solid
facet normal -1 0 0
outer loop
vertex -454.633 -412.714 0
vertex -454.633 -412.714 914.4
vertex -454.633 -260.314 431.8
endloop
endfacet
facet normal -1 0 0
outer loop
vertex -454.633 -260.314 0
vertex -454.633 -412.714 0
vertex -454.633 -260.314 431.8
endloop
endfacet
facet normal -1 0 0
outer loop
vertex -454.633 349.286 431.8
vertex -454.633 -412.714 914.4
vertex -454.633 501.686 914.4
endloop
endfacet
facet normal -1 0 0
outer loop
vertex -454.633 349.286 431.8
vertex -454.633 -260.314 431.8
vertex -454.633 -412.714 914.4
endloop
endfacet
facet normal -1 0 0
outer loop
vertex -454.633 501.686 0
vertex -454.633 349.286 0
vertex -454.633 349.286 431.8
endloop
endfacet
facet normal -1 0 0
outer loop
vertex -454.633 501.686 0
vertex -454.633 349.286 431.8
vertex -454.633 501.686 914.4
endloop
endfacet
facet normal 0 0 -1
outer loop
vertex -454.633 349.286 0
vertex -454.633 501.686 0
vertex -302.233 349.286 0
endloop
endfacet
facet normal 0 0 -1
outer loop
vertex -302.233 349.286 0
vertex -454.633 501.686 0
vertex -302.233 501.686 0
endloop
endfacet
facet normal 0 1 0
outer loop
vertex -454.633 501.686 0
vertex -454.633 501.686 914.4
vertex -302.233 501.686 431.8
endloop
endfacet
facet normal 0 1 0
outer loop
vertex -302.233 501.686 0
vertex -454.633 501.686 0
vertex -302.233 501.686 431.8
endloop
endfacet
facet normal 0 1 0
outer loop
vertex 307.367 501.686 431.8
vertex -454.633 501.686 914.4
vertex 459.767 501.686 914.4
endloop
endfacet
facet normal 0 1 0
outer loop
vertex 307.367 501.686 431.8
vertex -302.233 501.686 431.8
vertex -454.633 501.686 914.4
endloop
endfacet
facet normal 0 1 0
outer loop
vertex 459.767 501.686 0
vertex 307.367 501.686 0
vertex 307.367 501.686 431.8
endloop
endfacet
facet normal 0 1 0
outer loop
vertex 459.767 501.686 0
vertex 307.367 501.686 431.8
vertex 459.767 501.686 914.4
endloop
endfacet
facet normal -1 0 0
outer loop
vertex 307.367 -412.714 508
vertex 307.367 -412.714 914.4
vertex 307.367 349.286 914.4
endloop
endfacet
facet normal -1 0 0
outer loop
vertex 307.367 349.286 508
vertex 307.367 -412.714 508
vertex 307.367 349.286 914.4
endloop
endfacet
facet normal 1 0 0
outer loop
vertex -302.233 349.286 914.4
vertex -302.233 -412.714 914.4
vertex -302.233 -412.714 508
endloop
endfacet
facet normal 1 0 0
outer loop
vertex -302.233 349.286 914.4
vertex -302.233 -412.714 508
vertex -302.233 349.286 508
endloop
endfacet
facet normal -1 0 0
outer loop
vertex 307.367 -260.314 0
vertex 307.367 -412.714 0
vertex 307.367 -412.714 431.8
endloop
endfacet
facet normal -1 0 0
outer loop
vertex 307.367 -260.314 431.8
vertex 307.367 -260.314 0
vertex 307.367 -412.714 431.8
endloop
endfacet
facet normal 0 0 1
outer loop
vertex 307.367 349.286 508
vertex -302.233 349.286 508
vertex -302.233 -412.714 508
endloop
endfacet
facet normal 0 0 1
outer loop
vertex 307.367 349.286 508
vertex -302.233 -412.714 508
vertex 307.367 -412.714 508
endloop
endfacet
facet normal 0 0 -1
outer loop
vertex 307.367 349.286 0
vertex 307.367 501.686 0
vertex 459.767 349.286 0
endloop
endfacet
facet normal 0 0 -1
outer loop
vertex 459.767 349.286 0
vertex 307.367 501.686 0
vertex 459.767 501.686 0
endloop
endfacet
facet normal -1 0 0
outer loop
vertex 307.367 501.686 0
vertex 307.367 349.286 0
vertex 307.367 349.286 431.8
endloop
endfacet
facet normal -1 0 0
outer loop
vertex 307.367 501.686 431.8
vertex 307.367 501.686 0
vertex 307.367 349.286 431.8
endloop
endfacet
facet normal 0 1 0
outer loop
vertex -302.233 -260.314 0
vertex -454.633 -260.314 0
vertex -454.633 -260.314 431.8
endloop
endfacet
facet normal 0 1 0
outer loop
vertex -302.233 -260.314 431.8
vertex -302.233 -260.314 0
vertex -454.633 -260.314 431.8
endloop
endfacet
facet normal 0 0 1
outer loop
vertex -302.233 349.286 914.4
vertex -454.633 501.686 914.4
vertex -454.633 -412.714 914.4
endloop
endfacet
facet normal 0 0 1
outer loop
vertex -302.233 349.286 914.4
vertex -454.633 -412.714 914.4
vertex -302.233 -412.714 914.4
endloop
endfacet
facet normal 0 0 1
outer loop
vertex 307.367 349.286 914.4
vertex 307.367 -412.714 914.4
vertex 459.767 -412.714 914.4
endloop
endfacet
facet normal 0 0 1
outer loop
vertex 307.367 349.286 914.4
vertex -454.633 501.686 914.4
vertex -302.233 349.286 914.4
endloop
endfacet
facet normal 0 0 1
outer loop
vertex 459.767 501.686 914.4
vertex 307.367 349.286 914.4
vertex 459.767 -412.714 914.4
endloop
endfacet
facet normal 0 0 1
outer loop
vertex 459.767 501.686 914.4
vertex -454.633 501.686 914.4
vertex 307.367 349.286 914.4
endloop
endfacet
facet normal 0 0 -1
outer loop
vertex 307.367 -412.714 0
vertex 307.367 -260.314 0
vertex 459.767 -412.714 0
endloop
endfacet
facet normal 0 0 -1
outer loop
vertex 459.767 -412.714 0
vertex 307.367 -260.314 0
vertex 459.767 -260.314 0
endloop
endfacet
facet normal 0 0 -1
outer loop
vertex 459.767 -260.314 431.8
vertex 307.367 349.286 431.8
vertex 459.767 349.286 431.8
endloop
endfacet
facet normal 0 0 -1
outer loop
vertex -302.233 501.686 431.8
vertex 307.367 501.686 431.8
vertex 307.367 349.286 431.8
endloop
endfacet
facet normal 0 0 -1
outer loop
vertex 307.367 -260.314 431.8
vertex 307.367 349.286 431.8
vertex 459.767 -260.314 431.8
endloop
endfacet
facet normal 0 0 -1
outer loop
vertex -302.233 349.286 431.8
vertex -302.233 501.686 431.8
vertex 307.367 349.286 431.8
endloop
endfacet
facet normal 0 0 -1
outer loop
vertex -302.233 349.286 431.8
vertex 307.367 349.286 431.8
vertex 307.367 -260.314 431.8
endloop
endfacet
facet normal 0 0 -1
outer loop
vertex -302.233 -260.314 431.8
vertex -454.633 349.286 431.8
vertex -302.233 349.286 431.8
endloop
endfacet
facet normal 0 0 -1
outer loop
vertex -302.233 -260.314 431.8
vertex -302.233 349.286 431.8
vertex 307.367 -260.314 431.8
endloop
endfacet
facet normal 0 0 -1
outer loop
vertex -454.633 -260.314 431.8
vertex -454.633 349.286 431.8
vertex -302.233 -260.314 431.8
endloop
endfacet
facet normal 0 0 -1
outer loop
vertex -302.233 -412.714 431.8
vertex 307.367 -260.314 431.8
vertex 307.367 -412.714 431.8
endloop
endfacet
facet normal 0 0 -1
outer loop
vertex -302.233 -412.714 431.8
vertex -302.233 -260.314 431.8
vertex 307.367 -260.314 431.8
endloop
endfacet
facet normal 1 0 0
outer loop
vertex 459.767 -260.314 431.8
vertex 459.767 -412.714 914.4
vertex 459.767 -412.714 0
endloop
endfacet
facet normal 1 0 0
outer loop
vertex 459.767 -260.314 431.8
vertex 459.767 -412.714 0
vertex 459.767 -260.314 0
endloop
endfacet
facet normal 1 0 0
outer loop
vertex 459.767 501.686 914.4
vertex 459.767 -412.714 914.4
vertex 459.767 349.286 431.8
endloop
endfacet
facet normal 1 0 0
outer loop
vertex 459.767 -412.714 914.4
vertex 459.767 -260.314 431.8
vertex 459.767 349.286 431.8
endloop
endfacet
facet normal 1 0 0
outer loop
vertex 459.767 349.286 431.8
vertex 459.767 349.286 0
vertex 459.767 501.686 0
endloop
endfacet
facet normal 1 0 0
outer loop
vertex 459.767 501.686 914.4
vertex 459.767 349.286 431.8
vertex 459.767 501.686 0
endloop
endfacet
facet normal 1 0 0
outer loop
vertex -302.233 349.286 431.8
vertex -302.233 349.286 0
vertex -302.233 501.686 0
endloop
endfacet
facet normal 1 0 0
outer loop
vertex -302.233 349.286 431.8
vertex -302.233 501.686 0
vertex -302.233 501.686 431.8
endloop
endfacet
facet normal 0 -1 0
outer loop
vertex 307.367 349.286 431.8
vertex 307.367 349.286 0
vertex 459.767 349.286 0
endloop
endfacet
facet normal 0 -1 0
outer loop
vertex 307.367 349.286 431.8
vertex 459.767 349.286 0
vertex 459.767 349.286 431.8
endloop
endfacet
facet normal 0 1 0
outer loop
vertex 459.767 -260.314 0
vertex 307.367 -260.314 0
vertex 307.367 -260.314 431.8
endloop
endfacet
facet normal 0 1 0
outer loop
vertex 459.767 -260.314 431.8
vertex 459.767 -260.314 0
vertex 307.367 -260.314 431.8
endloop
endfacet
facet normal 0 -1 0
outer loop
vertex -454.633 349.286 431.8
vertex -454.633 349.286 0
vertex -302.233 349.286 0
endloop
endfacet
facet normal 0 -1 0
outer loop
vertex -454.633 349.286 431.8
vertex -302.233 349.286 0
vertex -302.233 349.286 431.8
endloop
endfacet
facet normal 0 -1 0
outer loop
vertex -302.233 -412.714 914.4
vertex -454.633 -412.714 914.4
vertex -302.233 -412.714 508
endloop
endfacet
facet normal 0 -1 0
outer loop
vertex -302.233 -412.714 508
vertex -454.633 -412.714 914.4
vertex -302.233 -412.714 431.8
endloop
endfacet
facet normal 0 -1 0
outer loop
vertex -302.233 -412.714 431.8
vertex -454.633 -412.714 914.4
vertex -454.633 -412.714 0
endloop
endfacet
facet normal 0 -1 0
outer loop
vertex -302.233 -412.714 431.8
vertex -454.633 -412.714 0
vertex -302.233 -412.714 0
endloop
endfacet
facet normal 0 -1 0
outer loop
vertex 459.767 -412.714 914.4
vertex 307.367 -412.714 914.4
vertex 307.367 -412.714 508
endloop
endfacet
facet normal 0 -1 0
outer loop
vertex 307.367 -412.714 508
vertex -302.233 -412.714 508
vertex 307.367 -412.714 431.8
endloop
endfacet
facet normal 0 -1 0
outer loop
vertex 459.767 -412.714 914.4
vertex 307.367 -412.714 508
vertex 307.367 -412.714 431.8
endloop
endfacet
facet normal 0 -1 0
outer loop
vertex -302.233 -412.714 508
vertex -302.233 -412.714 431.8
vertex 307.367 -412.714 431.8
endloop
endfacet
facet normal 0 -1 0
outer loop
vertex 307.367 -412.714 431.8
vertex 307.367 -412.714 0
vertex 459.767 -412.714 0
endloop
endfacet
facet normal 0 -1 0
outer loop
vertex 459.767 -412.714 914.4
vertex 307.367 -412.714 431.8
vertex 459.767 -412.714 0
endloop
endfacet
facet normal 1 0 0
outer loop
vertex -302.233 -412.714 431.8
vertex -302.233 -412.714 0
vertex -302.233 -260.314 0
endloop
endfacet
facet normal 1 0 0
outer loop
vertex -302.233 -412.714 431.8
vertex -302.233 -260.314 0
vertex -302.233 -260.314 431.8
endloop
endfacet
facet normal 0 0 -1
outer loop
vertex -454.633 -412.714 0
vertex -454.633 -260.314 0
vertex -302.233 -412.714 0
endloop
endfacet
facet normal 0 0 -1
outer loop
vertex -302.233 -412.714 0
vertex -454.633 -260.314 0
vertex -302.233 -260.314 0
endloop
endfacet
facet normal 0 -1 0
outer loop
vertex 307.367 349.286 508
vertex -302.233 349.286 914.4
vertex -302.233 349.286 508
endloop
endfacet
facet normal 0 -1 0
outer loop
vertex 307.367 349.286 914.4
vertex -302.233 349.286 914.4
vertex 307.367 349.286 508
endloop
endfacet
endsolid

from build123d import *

# Parameters (mm, degrees)
F0_W     = 914.4
F0_H     = 914.4
F1_DEPTH = 914.4
F2_W     = 609.6
F2_H     = 762
F3_DEPTH = 406.4
F4_W     = 609.6
F4_H     = 431.8
F5_DEPTH = 914.401
F6_W     = 609.6
F6_H     = 431.8
F7_DEPTH = 914.401


with BuildPart() as f1:
    # F0 (on Top) → F1 (new body)
    with BuildSketch(Plane.XY):
        with Locations((2.566727, 44.486442)):
            Rectangle(F0_W, F0_H)
    extrude(amount=F1_DEPTH)

    # F2 (on face) → F3 (cut)
    with BuildSketch(Plane.XY.offset(914.4)):
        with Locations((2.566727, -31.713558)):
            Rectangle(F2_W, F2_H)
    extrude(amount=-F3_DEPTH, mode=Mode.SUBTRACT)

    # F4 (on face) → F5 (cut, through all)
    with BuildSketch(Plane.XZ.offset(412.713558)):
        with Locations((2.566727, 215.9)):
            Rectangle(F4_W, F4_H)
    extrude(amount=-F5_DEPTH, mode=Mode.SUBTRACT)

    # F6 (on face) → F7 (cut, through all)
    with BuildSketch(Plane(origin=(-454.633273, 0, 0), x_dir=(0, -1, 0), z_dir=(-1, 0, 0))):
        with Locations((-44.486442, 215.9)):
            Rectangle(F6_W, F6_H)
    extrude(amount=-F7_DEPTH, mode=Mode.SUBTRACT)


solid = f1.part
